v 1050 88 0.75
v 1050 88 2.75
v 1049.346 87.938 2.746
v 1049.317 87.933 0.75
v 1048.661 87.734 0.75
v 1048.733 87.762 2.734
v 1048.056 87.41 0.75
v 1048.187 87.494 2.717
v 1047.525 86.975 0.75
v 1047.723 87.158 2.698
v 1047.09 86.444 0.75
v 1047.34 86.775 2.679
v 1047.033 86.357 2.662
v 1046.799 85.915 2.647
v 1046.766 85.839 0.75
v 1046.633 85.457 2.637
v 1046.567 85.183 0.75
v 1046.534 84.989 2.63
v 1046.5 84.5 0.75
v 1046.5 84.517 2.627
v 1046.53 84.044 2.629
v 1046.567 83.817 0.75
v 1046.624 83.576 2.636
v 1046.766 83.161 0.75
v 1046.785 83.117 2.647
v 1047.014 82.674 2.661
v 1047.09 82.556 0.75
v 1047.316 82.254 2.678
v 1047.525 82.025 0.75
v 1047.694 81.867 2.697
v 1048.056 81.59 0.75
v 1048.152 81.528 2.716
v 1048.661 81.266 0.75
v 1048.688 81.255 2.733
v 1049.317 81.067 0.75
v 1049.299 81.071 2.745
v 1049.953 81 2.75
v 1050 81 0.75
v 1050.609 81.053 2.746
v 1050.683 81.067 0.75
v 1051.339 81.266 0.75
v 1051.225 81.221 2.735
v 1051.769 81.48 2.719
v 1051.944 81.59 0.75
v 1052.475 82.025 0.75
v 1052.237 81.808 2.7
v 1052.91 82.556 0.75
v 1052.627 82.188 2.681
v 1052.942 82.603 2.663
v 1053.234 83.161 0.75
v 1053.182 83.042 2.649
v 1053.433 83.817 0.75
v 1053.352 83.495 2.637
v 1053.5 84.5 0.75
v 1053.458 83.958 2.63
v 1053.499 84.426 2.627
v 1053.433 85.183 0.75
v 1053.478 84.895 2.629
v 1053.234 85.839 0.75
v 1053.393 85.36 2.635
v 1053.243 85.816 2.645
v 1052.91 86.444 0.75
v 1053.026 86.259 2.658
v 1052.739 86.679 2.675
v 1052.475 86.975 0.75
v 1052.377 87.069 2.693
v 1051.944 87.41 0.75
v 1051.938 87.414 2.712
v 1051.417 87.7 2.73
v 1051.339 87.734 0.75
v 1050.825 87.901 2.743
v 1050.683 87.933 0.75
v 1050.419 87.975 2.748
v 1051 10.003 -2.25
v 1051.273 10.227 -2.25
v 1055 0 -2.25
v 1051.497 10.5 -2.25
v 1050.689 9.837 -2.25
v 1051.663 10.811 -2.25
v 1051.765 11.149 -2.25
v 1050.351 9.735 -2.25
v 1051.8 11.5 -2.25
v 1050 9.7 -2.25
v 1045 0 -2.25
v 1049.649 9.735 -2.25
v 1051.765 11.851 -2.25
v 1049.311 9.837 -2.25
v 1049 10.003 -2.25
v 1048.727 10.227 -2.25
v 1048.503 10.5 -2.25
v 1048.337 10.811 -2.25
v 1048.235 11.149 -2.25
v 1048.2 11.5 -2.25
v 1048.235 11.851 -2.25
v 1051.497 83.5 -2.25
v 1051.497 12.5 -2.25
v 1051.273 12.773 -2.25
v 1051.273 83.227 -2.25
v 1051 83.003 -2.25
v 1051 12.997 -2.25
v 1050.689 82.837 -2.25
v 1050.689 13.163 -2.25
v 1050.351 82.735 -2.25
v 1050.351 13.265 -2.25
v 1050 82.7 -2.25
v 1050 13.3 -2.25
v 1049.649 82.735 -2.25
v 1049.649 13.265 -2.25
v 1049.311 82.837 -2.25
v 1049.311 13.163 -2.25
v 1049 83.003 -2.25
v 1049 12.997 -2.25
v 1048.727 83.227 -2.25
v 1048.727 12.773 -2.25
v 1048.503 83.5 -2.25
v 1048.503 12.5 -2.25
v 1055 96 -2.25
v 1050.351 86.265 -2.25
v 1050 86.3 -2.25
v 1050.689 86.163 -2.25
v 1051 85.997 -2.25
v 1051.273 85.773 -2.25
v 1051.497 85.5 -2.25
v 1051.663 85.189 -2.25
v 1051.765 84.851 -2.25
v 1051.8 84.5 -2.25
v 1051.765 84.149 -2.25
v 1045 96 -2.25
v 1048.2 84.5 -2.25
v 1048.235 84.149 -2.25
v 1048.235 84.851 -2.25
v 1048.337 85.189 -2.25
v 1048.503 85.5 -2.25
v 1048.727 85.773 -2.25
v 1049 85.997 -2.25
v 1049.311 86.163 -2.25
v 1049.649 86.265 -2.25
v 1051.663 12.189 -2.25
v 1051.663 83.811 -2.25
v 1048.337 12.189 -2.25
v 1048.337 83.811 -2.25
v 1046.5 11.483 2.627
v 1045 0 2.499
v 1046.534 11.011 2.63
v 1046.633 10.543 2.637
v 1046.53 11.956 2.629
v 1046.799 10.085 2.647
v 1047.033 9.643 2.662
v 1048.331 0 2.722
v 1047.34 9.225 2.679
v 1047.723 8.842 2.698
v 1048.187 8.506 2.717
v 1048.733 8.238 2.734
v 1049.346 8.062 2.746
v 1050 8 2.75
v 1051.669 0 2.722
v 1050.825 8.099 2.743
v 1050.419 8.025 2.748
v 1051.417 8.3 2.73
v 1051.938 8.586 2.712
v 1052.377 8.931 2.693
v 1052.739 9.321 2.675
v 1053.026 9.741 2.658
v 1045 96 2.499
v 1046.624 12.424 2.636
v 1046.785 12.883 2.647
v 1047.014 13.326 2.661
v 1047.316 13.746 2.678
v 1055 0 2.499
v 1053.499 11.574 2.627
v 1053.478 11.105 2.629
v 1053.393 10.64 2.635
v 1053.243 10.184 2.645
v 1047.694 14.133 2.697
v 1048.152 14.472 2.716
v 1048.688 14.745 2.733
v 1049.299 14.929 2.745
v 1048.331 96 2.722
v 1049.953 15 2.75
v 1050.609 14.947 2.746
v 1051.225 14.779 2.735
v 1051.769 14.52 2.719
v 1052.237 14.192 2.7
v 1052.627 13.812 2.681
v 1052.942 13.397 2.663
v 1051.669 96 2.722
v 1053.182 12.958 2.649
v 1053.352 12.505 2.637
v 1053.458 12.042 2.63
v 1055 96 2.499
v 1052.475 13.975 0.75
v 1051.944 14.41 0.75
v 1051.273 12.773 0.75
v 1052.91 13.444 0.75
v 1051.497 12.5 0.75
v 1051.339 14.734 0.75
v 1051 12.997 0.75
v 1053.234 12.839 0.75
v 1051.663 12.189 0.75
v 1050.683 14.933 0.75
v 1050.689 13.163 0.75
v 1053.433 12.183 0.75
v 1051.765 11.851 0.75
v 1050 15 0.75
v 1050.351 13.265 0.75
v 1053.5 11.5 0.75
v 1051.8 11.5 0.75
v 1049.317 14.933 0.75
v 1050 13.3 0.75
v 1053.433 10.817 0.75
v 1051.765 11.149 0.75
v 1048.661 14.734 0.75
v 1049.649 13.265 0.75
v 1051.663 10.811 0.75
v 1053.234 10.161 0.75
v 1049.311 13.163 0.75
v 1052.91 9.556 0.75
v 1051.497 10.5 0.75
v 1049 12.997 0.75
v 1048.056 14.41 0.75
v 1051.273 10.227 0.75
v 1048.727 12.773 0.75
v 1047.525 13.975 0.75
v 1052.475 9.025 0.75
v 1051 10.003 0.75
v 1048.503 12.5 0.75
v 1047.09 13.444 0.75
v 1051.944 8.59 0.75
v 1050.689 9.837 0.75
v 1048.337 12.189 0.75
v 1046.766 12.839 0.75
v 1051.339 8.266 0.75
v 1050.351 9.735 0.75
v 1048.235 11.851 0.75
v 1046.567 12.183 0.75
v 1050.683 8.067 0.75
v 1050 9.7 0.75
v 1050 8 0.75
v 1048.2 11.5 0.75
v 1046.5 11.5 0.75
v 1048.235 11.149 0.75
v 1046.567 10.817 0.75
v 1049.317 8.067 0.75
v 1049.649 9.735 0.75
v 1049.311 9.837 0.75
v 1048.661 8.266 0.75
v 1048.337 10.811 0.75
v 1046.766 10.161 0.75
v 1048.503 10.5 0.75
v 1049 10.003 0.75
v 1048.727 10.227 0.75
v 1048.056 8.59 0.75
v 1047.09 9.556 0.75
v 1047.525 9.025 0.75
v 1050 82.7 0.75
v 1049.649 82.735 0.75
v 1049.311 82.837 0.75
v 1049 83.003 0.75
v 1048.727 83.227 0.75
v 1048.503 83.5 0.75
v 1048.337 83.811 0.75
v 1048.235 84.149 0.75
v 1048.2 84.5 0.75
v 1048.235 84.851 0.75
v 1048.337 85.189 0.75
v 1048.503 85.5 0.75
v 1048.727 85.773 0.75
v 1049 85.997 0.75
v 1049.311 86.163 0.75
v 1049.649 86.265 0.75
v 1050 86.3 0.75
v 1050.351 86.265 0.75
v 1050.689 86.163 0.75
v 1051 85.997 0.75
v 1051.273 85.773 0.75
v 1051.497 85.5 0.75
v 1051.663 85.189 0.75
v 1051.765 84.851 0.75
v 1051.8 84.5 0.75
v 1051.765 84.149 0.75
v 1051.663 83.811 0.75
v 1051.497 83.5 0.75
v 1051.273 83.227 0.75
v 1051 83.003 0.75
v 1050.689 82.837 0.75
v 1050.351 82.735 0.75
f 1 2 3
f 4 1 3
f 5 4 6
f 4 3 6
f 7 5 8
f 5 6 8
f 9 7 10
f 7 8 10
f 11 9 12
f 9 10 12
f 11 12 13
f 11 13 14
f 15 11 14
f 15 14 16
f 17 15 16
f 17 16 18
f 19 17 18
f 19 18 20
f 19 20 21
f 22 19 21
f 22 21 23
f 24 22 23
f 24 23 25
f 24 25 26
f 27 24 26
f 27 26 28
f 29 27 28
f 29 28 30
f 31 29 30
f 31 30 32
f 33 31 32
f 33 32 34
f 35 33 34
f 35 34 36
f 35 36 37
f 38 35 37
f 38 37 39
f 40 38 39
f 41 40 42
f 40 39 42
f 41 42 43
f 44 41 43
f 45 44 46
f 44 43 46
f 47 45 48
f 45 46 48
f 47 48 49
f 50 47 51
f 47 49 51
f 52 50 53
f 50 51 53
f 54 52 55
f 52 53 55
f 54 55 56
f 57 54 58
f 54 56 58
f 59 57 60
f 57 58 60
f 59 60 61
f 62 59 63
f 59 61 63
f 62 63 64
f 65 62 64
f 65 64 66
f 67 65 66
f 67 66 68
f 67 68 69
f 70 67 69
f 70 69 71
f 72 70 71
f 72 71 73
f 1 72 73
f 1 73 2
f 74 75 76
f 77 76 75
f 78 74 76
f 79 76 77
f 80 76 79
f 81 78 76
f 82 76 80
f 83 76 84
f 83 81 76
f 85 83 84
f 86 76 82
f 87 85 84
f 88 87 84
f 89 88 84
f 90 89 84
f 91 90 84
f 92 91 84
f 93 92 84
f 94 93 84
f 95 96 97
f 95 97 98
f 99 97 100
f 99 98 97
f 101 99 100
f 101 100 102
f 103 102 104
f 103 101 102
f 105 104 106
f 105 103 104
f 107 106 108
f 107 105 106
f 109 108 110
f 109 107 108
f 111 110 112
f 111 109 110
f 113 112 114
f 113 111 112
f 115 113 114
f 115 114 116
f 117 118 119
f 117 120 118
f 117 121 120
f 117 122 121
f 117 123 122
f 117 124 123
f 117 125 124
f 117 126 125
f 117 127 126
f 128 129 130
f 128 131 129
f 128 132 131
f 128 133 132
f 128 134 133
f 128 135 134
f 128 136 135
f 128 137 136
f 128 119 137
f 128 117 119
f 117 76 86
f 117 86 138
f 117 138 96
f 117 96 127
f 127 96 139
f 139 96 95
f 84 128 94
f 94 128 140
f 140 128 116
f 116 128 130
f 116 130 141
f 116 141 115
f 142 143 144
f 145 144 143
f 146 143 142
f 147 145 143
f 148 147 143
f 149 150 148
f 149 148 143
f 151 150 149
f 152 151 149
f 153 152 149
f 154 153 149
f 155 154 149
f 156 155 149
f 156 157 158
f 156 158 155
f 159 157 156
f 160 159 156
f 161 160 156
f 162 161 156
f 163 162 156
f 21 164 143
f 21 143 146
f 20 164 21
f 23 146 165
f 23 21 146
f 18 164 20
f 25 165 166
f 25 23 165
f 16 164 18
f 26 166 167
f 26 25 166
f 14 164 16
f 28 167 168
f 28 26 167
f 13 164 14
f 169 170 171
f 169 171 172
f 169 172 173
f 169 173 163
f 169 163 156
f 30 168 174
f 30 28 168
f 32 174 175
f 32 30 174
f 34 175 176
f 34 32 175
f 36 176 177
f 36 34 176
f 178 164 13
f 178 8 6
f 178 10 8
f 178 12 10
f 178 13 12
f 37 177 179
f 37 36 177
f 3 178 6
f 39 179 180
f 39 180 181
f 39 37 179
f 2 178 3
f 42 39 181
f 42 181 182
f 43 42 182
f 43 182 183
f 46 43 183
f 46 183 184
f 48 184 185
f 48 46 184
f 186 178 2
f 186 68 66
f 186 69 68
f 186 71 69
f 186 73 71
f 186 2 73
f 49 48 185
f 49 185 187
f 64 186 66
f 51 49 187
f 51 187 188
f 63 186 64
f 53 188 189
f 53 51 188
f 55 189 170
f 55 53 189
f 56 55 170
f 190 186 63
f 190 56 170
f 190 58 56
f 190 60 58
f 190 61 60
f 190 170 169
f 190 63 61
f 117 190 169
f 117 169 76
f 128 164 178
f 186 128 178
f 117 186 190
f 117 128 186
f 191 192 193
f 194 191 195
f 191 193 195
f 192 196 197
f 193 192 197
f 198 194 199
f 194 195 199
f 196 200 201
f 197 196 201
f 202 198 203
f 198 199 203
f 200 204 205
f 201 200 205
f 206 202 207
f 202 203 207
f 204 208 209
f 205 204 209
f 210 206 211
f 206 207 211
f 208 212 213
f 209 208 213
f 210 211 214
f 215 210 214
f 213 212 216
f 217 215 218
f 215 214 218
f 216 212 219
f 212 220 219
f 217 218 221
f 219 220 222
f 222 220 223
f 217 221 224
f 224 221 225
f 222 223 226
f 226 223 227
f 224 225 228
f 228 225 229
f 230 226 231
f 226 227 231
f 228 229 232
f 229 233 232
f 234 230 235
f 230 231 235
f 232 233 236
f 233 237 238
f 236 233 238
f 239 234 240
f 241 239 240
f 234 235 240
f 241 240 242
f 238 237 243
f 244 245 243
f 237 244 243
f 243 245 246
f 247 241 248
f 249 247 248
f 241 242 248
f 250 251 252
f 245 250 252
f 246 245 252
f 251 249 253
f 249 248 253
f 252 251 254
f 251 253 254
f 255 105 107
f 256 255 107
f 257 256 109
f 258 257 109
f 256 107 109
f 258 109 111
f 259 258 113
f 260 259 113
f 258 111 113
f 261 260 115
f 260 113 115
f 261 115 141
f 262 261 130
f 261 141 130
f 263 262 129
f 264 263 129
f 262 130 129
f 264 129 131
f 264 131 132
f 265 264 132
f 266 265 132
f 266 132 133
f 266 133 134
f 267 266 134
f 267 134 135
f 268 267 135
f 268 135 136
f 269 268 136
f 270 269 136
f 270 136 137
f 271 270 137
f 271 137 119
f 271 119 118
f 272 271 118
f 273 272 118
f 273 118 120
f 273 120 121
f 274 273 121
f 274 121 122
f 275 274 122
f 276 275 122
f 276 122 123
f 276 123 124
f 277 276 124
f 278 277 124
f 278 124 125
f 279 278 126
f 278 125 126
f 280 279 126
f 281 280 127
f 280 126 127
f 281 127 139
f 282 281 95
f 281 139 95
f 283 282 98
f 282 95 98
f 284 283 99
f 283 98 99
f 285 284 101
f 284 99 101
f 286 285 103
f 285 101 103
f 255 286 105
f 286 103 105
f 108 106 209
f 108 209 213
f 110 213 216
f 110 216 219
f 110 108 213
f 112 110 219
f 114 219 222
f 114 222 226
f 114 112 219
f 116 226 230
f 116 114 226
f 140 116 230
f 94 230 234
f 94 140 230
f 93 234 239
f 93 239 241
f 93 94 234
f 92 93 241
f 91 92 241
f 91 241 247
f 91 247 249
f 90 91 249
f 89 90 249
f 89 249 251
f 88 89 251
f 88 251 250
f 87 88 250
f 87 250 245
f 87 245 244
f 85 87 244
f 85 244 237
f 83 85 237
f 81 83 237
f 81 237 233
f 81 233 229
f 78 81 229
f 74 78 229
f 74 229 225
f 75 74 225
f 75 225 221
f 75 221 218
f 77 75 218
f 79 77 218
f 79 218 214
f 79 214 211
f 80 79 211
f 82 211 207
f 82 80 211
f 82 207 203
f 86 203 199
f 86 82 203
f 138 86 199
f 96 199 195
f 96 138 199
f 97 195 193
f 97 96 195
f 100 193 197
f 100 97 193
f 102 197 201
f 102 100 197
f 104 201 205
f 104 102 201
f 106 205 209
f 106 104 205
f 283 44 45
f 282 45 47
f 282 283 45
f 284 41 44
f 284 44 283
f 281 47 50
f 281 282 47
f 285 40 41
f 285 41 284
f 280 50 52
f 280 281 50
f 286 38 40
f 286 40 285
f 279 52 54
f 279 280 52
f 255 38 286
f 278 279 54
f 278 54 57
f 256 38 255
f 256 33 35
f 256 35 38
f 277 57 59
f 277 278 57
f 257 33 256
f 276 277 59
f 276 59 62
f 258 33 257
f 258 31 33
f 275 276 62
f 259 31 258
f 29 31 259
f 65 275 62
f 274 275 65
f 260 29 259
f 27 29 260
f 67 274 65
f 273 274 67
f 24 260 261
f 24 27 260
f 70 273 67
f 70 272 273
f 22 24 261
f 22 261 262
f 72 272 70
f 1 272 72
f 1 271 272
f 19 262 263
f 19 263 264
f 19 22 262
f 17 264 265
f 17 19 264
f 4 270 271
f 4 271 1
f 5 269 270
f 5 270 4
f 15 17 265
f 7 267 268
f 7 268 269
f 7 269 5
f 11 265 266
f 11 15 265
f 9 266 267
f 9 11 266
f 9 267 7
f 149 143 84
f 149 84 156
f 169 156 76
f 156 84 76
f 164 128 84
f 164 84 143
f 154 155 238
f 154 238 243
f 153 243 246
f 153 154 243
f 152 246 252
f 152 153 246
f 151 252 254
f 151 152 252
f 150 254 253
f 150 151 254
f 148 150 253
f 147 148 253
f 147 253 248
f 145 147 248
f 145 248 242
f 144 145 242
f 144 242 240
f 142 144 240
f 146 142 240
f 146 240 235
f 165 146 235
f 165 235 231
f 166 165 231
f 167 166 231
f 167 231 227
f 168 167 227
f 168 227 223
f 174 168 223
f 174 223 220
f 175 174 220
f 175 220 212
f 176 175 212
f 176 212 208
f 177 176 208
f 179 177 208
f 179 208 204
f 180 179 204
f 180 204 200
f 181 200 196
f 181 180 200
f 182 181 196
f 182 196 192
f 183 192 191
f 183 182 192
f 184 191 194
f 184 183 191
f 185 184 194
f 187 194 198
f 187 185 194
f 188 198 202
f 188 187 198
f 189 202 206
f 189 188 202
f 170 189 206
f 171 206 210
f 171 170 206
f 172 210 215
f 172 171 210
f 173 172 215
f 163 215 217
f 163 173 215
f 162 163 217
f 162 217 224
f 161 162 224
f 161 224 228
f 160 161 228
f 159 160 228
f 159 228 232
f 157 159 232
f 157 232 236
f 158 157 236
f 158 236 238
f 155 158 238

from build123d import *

# Parameters (mm, degrees)
EXTRUDE_1_DEPTH              = 96
HOLE_WIZARD_M3_1_D           = 3.6
HOLE_WIZARD_M3_1_DEPTH       = 5
HOLE_WIZARD_M3_1_CBORE_D     = 7
HOLE_WIZARD_M3_1_CBORE_DEPTH = 2


with BuildPart() as part:
    # 草图1 → 凸台-拉伸1 (new body)
    with BuildSketch(Plane(origin=(0, 96, 0), x_dir=(1, 0, 0), z_dir=(0, 1, 0))):
        with BuildLine():
            Line((1055, -2.499371855), (1055, 2.25))
            Line((1055, 2.25), (1045, 2.25))
            Line((1045, 2.25), (1045, -2.499371855))
            ThreePointArc((1045, -2.499371855), (1050, -2.75), (1055, -2.499371855))
        make_face()
    extrude(amount=-EXTRUDE_1_DEPTH)

    # M3 六角头机械螺钉的柱形沉头孔1
    with Locations(Plane(origin=(1050, 84.5, 2.75), x_dir=(0, 1, 0), z_dir=(0, 0, 1))):
        with Locations((0, 0)):
            hole_wizard_m3_1 = CounterBoreHole(HOLE_WIZARD_M3_1_D / 2, HOLE_WIZARD_M3_1_CBORE_D / 2, HOLE_WIZARD_M3_1_CBORE_DEPTH, depth=HOLE_WIZARD_M3_1_DEPTH)

    # 镜向1: M3 六角头机械螺钉的柱形沉头孔1 across plane
    add(hole_wizard_m3_1.mirror(Plane(origin=(0, 48, 0), x_dir=(0, 0, 1), z_dir=(0, -1, 0))), mode=Mode.SUBTRACT)


solid = part.part
